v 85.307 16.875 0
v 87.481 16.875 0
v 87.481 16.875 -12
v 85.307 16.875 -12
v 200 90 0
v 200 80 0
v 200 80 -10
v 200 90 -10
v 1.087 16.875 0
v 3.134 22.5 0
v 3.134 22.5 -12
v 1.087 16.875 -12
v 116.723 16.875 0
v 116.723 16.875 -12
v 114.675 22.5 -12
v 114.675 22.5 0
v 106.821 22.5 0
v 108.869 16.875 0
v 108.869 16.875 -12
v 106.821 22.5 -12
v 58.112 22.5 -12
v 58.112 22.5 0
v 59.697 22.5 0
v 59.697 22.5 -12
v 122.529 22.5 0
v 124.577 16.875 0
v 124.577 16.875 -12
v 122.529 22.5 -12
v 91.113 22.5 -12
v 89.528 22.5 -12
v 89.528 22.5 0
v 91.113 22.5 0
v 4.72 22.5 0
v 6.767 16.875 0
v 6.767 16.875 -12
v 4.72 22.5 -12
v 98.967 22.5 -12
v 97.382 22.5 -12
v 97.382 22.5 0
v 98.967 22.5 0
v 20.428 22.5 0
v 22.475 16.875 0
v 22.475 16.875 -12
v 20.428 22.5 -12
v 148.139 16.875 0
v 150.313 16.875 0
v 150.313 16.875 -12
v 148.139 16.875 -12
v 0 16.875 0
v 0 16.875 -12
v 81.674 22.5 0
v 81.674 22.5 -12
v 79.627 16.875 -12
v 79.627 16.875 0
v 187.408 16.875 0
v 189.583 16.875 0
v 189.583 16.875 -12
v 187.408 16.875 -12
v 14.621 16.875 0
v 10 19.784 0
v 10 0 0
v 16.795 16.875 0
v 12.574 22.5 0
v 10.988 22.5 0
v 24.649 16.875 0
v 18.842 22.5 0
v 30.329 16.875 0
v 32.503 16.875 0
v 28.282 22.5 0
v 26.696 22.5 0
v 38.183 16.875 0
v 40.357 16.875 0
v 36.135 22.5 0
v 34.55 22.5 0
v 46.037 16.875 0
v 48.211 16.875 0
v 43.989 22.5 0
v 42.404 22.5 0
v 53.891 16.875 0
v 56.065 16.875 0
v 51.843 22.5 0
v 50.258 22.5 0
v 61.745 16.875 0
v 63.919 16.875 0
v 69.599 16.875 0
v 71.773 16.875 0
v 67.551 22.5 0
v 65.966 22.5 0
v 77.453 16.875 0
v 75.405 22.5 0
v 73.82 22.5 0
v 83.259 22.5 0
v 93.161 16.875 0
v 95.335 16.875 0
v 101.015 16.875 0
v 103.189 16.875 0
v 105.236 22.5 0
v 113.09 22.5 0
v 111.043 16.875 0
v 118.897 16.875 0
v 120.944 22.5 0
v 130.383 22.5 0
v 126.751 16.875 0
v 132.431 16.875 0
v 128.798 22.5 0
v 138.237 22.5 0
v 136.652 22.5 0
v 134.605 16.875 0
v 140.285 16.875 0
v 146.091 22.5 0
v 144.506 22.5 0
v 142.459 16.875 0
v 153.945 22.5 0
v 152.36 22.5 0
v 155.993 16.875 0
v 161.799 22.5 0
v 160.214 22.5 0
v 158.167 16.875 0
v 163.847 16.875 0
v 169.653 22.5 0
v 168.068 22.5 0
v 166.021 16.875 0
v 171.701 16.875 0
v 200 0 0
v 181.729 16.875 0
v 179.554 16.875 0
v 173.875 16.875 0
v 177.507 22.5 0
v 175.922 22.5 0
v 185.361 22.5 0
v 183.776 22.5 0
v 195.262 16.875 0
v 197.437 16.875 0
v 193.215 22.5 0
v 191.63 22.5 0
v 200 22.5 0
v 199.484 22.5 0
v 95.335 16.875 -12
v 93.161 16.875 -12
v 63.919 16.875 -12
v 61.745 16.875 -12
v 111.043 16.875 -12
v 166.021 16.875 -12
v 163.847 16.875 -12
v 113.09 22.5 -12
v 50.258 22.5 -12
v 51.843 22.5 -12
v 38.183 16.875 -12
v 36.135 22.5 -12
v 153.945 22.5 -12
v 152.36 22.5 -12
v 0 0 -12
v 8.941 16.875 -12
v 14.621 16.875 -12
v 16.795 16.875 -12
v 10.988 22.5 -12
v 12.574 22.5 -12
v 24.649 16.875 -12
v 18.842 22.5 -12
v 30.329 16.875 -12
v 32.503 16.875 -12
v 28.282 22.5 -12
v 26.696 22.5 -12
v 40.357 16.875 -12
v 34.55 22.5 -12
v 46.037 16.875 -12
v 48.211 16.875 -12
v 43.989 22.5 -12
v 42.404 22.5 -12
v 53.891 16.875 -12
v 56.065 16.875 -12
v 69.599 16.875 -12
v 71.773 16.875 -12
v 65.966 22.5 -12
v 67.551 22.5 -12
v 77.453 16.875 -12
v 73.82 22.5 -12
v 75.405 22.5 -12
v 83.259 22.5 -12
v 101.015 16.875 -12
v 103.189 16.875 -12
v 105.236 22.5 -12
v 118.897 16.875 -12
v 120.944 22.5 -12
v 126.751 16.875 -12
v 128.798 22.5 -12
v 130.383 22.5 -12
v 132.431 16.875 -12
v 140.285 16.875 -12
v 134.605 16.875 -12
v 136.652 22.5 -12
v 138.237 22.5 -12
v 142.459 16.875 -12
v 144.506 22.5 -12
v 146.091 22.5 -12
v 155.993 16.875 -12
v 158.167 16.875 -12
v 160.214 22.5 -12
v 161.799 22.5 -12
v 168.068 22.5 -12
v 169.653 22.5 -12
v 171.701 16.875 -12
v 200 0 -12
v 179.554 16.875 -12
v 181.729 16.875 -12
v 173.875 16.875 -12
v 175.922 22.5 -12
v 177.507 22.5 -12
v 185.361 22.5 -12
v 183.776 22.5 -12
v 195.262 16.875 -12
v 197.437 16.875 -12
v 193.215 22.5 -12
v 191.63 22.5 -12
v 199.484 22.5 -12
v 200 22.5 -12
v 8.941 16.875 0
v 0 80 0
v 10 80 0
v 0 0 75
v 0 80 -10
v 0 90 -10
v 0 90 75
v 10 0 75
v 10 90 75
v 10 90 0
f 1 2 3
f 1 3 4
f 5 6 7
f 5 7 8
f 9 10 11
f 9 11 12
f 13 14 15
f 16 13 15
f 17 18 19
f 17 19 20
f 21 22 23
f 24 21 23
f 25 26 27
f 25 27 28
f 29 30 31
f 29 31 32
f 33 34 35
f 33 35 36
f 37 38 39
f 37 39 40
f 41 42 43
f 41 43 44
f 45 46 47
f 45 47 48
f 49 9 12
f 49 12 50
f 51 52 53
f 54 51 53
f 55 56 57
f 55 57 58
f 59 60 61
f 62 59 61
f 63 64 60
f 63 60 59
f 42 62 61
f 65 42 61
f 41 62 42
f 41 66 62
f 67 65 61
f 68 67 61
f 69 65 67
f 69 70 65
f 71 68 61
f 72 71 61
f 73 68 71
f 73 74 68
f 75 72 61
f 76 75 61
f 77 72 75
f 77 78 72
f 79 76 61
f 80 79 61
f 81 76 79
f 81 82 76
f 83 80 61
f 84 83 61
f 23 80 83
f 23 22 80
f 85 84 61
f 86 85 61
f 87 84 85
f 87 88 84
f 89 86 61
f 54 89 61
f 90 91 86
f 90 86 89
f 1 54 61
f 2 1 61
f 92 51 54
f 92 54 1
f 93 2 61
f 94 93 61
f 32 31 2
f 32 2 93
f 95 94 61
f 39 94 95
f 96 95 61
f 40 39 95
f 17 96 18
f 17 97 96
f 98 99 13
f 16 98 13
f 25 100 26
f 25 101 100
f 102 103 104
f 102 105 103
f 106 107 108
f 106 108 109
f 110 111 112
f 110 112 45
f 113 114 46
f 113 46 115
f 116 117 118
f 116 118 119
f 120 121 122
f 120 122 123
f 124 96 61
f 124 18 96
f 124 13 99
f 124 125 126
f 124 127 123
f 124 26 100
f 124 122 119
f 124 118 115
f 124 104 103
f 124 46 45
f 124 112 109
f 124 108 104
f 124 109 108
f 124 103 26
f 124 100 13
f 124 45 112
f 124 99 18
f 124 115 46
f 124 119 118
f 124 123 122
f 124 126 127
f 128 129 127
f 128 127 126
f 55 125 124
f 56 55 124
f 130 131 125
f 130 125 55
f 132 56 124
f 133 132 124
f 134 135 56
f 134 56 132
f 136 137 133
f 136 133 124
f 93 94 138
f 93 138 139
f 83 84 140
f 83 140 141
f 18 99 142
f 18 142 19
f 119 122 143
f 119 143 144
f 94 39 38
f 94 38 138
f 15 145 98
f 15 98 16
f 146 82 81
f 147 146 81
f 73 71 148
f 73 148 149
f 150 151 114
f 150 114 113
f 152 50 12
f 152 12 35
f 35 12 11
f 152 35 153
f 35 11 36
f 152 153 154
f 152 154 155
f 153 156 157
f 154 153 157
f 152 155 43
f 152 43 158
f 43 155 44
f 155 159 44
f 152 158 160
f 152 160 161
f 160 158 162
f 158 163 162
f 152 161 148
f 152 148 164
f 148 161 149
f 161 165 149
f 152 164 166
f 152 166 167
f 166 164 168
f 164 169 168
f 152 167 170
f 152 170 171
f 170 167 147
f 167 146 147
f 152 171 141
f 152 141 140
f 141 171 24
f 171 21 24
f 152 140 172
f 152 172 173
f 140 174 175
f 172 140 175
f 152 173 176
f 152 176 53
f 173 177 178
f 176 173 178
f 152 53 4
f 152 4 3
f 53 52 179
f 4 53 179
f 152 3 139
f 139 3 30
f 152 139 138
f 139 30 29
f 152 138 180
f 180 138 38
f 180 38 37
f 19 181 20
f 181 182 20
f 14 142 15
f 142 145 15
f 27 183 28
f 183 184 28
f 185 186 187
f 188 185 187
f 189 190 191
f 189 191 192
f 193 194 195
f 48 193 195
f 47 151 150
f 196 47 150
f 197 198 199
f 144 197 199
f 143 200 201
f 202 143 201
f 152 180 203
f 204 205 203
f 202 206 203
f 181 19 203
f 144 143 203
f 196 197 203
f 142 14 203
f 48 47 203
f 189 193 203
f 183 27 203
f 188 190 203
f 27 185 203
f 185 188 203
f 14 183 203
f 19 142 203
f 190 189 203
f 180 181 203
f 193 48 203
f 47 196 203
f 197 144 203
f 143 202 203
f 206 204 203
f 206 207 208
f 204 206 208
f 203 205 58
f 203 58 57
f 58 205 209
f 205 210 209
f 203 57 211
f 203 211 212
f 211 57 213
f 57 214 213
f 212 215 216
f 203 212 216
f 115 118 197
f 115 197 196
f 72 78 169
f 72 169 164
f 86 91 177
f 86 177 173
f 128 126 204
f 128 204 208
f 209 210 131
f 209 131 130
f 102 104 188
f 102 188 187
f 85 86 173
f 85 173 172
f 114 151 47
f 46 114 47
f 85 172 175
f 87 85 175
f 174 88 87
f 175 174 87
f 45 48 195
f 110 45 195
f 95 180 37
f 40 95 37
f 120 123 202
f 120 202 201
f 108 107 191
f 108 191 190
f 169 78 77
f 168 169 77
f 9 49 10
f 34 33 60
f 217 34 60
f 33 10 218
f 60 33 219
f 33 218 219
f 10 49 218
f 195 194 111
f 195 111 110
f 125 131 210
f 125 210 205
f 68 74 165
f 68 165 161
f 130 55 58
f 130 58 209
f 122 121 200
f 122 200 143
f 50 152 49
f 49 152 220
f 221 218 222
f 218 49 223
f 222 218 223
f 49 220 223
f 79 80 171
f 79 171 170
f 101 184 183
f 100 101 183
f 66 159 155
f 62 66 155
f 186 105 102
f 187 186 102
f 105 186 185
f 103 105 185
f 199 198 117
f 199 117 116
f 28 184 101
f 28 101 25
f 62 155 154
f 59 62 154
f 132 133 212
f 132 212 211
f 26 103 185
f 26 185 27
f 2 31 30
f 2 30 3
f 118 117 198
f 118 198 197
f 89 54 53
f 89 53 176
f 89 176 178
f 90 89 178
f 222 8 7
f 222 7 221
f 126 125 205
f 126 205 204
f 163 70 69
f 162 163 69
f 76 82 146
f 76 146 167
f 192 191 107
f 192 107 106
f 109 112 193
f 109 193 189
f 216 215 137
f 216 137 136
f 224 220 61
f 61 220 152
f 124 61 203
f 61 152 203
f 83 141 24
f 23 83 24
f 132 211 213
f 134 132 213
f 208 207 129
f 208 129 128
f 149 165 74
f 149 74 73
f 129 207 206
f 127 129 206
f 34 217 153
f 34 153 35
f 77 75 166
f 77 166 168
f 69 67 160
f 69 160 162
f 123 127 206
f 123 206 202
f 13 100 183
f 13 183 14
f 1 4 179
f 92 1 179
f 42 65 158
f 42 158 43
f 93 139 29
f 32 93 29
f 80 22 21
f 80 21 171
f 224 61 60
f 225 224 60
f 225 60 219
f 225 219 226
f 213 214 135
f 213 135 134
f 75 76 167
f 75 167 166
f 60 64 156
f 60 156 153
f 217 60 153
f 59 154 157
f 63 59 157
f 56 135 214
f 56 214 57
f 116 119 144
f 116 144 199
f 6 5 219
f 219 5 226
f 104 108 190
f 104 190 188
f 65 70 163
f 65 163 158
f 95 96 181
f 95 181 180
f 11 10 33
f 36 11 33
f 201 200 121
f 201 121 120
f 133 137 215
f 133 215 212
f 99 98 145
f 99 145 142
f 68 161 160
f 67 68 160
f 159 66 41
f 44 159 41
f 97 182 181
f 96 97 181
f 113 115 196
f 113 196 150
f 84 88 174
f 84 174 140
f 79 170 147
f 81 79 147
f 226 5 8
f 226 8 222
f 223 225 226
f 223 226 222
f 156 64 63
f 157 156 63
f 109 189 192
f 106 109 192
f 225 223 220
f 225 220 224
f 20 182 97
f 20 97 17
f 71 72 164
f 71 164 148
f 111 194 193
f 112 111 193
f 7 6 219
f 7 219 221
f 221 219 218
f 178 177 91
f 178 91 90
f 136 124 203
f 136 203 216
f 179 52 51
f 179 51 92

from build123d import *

# Parameters (mm, degrees)
BLANKSKE_W          = 200
BLANKSKE_H          = 22.5
BLANK_DEPTH         = 12
TOOTHCUTSIM_DEPTH   = 202.619071519
TEETHCUTS_COUNT     = 26
TEETHCUTS_PITCH     = 7.853981625
SKETCH2_W           = 10
SKETCH2_H           = 90
BOSS_EXTRUDE1_DEPTH = 75
SKETCH3_W           = 200
SKETCH3_H           = 10
BOSS_EXTRUDE2_DEPTH = 10


with BuildPart() as part:
    # BlankSke → Blank (new body)
    with BuildSketch(Plane.XY):
        with Locations((100, 11.25)):
            Rectangle(BLANKSKE_W, BLANKSKE_H)
    extrude(amount=-BLANK_DEPTH)

    # TooCutSkeSim → ToothCutSim (cut, through all)
    with BuildSketch(Plane.XY):
        Polygon((1.087088424, 16.875), (-1.087088424, 16.875), (-3.143665836, 22.5254), (3.143665836, 22.5254), align=None)
    toothcutsim = extrude(amount=-TOOTHCUTSIM_DEPTH, mode=Mode.SUBTRACT)

    # TeethCuts: ToothCutSim ×26
    with Locations(*[(i * TEETHCUTS_PITCH, 0, 0) for i in range(1, TEETHCUTS_COUNT)]):
        add(toothcutsim, mode=Mode.SUBTRACT)

    # Sketch2 → Boss-Extrude1 (add)
    with BuildSketch(Plane.XY):
        with Locations((5, 45)):
            Rectangle(SKETCH2_W, SKETCH2_H)
    extrude(amount=BOSS_EXTRUDE1_DEPTH)

    # Sketch3 → Boss-Extrude2 (add)
    with BuildSketch(Plane(origin=(0, 0, 0), x_dir=(-1, 0, 0), z_dir=(0, 0, -1))):
        with Locations((-100, 85)):
            Rectangle(SKETCH3_W, SKETCH3_H)
    extrude(amount=BOSS_EXTRUDE2_DEPTH)


solid = part.part
